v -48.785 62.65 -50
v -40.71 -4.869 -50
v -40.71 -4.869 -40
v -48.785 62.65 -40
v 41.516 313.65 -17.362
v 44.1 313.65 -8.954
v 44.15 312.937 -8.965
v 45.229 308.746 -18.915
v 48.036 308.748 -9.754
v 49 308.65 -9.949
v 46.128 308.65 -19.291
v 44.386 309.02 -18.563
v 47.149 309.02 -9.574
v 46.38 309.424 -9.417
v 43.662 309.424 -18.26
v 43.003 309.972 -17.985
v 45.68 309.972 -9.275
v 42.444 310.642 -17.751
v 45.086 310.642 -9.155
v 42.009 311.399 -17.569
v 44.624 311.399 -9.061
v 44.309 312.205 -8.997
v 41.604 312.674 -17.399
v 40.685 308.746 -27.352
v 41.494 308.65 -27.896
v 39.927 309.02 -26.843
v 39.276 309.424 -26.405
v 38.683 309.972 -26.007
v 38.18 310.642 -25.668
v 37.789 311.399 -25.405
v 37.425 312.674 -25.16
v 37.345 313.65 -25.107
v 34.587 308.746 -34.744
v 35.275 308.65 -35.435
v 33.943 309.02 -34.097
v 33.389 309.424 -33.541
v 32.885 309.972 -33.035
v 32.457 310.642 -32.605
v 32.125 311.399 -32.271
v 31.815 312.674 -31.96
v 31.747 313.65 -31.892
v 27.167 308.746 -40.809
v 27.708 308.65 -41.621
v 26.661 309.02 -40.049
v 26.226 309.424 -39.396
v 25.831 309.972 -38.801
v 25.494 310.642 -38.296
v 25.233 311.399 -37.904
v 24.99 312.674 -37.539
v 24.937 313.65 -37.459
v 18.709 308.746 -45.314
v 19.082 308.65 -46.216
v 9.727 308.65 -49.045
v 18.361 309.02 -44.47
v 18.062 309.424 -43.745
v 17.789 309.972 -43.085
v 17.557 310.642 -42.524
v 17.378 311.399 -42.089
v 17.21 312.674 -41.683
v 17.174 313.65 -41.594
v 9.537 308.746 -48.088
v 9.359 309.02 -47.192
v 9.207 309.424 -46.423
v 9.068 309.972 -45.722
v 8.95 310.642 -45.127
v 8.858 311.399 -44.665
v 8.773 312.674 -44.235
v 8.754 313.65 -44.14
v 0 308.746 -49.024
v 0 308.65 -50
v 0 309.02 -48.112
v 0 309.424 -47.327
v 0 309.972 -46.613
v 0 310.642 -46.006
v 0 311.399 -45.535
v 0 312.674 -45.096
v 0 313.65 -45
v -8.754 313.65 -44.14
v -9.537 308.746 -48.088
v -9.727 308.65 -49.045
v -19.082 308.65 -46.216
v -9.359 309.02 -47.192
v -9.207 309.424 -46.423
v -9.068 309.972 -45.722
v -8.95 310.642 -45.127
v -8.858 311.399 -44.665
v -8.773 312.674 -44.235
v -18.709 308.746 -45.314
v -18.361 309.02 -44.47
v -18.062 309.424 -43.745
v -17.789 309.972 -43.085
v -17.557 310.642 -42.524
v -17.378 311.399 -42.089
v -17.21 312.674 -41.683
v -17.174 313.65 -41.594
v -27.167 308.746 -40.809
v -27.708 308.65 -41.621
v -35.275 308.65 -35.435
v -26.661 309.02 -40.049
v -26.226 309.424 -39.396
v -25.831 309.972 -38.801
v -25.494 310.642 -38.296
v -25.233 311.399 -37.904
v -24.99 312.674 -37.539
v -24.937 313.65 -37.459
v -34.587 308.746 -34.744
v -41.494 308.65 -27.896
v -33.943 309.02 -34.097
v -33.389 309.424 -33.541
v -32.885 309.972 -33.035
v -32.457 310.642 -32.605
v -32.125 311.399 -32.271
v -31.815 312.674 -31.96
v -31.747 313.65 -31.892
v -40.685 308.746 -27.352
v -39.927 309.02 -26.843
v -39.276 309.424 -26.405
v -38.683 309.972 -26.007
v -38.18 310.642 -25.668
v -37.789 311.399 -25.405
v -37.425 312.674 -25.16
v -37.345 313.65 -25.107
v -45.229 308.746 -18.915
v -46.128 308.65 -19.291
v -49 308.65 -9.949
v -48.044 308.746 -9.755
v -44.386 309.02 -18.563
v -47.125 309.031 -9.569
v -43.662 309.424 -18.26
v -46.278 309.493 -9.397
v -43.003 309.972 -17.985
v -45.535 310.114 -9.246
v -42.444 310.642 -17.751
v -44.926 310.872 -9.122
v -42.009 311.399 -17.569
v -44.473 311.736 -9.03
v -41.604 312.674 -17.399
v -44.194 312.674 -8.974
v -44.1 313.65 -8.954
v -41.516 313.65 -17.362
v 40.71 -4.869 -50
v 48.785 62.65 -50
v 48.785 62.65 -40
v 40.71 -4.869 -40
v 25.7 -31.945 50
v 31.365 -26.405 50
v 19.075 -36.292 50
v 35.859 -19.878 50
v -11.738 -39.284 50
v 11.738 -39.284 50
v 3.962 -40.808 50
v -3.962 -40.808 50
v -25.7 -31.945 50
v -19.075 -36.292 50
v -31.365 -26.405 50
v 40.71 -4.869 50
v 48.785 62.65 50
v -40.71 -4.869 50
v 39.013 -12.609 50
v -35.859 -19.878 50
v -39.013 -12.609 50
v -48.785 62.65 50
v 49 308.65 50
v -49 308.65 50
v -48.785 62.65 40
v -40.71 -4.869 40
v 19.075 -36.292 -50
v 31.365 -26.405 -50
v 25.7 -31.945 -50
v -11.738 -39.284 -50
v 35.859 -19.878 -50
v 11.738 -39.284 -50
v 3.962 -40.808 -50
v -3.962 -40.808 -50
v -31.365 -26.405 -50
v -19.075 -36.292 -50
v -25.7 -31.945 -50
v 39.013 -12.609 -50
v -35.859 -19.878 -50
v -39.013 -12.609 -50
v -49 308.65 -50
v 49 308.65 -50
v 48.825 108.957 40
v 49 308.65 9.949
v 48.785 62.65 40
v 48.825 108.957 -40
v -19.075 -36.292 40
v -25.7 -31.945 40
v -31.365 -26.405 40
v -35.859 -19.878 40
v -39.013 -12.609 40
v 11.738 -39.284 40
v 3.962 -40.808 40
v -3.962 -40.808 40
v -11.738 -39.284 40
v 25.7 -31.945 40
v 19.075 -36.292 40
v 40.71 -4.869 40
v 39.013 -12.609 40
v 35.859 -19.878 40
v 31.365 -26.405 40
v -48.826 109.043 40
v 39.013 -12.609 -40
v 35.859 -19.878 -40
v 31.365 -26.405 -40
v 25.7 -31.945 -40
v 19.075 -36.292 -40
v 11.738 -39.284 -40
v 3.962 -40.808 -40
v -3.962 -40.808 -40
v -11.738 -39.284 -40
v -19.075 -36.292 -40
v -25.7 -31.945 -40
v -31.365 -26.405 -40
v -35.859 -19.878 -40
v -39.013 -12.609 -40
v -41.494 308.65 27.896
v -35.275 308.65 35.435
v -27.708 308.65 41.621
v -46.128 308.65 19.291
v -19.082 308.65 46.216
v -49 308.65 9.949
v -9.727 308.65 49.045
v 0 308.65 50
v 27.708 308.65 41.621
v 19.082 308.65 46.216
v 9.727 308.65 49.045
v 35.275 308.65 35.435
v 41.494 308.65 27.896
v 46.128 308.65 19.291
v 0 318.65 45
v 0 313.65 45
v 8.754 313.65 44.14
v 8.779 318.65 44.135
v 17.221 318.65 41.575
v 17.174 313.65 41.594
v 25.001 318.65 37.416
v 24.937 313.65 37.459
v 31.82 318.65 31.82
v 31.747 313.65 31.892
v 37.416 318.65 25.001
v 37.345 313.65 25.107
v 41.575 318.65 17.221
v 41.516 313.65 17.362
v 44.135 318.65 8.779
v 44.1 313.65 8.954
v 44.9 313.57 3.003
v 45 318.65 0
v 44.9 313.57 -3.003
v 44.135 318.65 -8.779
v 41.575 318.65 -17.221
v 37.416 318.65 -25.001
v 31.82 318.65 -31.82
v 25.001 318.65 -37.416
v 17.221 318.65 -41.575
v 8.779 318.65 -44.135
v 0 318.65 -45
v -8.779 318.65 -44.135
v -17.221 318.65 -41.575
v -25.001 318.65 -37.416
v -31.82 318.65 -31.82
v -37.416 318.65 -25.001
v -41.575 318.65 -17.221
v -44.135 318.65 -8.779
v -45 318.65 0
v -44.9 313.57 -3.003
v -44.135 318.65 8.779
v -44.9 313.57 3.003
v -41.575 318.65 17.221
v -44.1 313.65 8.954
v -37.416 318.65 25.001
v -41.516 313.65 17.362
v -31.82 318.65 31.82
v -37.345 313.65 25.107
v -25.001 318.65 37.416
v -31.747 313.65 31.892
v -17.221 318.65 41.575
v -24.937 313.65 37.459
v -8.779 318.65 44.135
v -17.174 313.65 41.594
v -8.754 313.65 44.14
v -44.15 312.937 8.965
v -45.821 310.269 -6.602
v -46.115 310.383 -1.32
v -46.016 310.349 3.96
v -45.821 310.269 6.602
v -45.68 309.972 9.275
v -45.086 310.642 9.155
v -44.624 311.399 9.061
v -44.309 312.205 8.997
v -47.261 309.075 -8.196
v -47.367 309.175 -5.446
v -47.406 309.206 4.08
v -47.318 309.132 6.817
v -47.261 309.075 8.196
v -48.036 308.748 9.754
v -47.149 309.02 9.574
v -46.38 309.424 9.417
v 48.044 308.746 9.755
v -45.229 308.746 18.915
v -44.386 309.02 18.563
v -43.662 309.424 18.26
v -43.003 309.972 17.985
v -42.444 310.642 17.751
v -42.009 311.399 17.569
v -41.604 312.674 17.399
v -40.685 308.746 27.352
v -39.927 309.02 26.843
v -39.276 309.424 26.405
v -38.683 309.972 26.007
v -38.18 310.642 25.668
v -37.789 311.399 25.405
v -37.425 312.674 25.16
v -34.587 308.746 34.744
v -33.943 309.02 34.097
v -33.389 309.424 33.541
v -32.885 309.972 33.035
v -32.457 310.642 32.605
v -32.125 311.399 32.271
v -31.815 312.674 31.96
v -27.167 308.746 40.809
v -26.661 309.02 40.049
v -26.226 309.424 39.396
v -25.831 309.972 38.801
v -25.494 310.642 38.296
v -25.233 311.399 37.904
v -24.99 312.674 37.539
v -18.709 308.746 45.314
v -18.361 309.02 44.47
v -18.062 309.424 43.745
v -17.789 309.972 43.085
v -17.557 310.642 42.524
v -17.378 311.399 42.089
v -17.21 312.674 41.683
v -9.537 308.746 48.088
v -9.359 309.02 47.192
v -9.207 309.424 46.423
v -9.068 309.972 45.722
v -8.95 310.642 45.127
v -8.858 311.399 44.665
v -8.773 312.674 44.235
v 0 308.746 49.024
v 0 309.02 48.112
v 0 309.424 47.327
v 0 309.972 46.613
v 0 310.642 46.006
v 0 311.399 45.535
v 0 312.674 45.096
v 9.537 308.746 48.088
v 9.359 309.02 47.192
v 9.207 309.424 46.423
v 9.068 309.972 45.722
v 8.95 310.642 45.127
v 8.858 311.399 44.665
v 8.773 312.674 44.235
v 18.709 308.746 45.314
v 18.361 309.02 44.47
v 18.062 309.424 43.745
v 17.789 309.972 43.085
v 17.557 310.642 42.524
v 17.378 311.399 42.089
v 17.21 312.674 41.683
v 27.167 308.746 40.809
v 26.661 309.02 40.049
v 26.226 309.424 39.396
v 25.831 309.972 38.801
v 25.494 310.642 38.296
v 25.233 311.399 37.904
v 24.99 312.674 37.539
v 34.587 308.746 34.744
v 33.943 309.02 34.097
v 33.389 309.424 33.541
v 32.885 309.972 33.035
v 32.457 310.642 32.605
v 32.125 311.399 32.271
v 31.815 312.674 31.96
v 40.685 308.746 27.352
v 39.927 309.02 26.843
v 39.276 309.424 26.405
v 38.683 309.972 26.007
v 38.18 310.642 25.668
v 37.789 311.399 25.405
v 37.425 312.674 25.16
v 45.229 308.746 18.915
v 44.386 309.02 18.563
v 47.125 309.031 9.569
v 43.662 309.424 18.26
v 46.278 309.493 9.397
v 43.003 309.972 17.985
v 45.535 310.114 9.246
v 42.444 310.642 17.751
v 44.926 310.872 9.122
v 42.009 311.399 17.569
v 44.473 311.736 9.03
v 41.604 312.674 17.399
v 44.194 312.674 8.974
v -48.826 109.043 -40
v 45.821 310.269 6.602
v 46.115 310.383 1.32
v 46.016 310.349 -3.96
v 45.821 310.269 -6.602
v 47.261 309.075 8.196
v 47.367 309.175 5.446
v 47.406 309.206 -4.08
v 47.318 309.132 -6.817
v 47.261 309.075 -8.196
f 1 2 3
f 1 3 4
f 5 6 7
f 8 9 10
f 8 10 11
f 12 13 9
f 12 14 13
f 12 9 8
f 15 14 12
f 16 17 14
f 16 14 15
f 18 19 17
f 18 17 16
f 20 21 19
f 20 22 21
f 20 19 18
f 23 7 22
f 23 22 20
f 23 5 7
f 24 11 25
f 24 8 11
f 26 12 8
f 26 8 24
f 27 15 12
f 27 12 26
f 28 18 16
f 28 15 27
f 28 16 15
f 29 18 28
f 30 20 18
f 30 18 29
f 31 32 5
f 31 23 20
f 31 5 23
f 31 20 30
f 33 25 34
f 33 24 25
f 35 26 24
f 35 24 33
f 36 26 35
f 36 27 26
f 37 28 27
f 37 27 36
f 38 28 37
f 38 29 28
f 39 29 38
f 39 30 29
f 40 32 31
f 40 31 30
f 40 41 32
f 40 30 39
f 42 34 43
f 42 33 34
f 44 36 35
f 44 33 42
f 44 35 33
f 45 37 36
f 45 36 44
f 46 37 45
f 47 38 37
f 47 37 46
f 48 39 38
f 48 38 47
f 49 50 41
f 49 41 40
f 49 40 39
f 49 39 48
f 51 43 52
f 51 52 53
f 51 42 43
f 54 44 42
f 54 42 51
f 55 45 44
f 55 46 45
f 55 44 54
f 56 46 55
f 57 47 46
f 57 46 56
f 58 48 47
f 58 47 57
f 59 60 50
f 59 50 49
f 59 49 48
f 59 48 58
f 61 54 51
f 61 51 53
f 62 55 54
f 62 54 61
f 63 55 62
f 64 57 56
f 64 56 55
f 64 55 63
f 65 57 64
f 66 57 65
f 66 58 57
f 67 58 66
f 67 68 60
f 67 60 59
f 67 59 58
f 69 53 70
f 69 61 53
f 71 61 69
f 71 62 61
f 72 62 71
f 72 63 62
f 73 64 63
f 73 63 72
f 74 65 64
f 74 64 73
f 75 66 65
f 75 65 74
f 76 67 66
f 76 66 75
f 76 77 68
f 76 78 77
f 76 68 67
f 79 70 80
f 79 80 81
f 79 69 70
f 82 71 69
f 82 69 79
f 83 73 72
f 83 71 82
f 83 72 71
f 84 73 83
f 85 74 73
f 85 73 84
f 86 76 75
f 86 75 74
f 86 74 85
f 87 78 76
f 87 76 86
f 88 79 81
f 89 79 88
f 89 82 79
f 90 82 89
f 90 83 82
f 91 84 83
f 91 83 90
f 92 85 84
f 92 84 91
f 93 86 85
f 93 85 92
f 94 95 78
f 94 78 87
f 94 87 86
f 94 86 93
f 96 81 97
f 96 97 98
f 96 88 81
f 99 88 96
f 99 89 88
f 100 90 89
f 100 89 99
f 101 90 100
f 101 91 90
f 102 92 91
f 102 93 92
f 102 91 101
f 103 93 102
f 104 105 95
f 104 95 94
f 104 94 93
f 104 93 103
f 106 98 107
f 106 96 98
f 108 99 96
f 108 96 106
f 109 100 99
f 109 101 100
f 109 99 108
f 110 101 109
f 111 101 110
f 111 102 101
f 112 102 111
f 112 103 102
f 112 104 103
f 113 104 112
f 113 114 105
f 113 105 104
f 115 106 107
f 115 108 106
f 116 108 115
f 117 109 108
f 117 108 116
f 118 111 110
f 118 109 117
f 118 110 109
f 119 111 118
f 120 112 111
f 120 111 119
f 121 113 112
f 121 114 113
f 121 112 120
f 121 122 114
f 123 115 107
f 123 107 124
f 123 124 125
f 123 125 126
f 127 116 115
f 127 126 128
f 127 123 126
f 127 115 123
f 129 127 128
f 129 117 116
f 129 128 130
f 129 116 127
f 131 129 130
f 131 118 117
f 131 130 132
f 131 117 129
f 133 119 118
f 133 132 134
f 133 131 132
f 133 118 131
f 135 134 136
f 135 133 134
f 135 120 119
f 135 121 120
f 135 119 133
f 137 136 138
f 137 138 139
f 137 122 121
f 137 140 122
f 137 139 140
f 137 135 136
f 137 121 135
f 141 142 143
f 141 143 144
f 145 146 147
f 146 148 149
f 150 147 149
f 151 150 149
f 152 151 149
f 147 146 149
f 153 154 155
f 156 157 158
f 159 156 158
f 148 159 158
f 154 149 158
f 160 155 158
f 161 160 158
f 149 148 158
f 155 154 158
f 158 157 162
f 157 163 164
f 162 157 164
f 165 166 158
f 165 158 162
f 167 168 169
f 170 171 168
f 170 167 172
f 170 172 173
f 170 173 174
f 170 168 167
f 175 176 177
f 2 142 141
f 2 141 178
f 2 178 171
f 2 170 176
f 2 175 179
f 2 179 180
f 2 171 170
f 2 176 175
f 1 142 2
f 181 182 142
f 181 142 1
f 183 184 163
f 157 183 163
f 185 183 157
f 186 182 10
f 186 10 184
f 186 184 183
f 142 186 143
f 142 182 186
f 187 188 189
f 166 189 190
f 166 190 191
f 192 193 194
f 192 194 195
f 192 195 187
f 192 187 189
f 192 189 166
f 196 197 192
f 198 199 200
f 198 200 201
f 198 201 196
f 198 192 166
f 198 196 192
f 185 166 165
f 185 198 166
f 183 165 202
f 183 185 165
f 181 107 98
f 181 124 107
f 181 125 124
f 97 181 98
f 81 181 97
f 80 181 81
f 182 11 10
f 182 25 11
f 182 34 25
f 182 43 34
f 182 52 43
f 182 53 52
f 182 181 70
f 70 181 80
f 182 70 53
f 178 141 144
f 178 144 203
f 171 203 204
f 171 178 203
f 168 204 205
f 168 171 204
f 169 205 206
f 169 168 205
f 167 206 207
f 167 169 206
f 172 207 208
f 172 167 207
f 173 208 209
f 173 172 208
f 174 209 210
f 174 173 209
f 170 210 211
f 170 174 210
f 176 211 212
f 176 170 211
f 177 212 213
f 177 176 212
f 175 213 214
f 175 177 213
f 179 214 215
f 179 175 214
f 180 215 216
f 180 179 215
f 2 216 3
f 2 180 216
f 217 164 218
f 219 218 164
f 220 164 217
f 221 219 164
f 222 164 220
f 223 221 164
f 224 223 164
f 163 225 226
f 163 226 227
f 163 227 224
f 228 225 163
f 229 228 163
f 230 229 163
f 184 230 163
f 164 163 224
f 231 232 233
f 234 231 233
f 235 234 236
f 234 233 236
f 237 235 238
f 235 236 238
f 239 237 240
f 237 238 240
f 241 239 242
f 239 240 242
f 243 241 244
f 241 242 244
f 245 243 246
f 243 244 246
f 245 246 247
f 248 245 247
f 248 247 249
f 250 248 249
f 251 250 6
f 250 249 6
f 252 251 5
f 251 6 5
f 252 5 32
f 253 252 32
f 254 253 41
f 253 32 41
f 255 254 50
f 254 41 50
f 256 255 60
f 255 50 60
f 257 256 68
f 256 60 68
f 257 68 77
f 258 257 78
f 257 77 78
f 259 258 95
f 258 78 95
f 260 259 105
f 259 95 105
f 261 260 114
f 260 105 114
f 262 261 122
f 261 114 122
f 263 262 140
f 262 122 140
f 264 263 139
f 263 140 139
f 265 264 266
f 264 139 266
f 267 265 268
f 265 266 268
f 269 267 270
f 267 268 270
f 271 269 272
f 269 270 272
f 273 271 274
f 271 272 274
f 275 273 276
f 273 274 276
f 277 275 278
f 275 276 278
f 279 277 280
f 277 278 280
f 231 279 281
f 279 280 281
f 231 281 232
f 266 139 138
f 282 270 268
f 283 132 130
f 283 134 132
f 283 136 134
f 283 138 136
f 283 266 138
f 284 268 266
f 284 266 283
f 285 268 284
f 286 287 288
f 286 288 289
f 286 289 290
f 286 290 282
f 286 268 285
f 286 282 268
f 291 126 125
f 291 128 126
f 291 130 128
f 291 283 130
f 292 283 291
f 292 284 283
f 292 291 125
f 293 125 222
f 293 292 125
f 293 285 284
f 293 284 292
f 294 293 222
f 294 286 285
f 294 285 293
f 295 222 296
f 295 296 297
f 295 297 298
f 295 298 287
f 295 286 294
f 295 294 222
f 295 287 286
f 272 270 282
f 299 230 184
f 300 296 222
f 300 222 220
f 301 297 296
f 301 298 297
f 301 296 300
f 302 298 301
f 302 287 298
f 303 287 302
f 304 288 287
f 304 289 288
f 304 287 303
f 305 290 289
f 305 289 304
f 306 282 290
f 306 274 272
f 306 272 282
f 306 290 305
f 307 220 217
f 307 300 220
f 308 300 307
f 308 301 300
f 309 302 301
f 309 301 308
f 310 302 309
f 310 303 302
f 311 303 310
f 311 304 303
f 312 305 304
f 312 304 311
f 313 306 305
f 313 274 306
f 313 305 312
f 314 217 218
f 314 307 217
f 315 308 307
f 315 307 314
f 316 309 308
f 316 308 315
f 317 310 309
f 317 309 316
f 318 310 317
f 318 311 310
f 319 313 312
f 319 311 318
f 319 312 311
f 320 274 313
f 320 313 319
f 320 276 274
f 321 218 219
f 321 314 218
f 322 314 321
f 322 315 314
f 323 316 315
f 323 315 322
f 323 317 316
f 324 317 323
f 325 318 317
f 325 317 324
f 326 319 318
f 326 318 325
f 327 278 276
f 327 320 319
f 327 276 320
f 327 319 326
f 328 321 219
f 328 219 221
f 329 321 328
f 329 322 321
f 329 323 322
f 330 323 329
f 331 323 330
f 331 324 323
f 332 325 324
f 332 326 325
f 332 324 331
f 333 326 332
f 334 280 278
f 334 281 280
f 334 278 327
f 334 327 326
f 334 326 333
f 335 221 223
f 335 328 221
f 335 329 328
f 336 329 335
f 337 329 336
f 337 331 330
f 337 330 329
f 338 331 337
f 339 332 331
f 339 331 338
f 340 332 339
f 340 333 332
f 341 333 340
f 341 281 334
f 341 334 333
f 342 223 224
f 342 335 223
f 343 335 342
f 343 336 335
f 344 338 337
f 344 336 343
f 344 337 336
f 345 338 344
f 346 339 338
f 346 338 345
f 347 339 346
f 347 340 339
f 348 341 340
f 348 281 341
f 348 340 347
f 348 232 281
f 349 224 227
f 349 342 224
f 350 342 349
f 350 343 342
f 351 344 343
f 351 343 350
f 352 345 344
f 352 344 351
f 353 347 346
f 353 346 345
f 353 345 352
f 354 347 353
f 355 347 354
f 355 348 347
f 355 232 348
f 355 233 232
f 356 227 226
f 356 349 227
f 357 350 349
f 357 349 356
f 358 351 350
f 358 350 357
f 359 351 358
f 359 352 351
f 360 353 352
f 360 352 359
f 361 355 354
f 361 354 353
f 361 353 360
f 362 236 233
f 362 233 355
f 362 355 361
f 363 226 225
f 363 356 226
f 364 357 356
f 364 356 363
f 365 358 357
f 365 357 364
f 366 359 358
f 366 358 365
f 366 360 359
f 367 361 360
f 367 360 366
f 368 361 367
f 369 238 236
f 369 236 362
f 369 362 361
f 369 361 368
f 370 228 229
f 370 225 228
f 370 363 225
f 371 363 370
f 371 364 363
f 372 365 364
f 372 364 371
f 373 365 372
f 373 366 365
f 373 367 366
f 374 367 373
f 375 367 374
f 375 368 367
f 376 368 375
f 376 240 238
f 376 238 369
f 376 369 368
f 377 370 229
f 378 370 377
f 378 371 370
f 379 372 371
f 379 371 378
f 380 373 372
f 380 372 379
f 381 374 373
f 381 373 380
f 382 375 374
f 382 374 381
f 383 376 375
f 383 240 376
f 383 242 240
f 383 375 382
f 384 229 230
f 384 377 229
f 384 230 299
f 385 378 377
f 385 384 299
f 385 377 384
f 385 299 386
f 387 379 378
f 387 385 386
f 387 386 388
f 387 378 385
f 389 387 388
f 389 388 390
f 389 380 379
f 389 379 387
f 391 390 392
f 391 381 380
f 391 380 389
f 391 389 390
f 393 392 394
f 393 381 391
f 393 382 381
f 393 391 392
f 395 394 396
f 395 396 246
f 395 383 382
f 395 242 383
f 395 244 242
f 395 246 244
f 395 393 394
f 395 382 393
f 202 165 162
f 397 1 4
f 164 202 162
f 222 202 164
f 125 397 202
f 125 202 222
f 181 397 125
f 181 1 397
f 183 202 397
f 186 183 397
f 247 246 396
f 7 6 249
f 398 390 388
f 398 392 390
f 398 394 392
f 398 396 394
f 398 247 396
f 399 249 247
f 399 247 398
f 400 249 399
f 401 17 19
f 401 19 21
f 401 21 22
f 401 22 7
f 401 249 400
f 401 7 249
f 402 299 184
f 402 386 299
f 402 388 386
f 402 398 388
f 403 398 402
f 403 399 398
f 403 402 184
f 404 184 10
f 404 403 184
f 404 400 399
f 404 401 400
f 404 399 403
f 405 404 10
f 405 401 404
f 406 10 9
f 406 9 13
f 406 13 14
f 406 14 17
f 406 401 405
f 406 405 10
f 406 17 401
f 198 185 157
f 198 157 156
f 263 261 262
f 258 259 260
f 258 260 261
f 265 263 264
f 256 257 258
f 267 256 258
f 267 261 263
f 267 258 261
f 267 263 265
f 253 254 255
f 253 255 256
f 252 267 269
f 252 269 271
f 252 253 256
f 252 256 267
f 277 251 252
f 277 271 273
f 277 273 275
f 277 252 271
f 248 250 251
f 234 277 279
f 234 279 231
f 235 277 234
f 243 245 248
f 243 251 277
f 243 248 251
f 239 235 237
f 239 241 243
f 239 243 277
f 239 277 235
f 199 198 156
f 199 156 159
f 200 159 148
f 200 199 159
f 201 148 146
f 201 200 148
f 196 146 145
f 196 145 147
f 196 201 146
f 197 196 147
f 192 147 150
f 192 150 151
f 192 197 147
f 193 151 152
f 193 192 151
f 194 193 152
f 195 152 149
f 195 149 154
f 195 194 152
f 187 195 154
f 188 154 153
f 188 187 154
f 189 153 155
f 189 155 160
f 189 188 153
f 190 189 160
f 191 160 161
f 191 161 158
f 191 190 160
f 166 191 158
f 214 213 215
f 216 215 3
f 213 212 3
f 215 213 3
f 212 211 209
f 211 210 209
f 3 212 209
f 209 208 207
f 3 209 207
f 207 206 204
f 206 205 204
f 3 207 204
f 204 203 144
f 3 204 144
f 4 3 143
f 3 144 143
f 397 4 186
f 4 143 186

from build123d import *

# Parameters (mm, degrees)
BOSS_EXTRUDE1_DEPTH      = 50
BOSS_EXTRUDE1_DEPTH_BACK = 50
SKETCH2_W                = 80
SKETCH2_H                = 150
CUT_EXTRUDE1_DEPTH       = 367.509355196
SKETCH3_R                = 45
BOSS_EXTRUDE2_DEPTH      = 10
FILLET1_R                = 5


with BuildPart() as part:
    # Sketch1 → Boss-Extrude1 (new, two sides: drawn at the far end of the back side and taken through both)
    with BuildSketch(Plane.XY.offset(-BOSS_EXTRUDE1_DEPTH_BACK)):
        with BuildLine():
            Line((-49, 0), (49, 0))
            Line((49, 0), (48.785008207, -245.999906054))
            Line((48.785008207, -245.999906054), (40.709882529, -313.518735615))
            ThreePointArc((40.709882529, -313.518735615), (0, -349.649909839), (-40.709882529, -313.518735615))
            Line((-40.709882529, -313.518735615), (-48.785008207, -245.999906054))
            Line((-48.785008207, -245.999906054), (-49, 0))
        make_face()
    extrude(amount=BOSS_EXTRUDE1_DEPTH + BOSS_EXTRUDE1_DEPTH_BACK)

    # Sketch2 → Cut-Extrude1 (cut, through all)
    with BuildSketch(Plane(origin=(48.999962574, -0.042823552, 0), x_dir=(0, 0, -1), z_dir=(0.9999996181052956, -0.0008739503779168433, 0))):
        with Locations((0, -274.649791967)):
            Rectangle(SKETCH2_W, SKETCH2_H)
    extrude(amount=-CUT_EXTRUDE1_DEPTH, mode=Mode.SUBTRACT)

    # Sketch3 → Boss-Extrude2 (add)
    with BuildSketch(Plane(origin=(0, 0, 0), x_dir=(1, 0, 0), z_dir=(0, 1, 0))):
        with Locations(Location((0, 0, 0), (0, 0, 270))):
            Circle(SKETCH3_R)
    extrude(amount=BOSS_EXTRUDE2_DEPTH)

    # Fillet1
    fillet1_edges = [part.edges().sort_by_distance(p)[0] for p in [
        (0, 0, -45),
    ]]
    fillet(fillet1_edges, radius=FILLET1_R - 0.0001)  # a hair under: the kernel refuses the full size


with BuildPart() as part_1:
    # Body-Move/Copy1: moved
    add(part.part.moved(Location((0, 308.649909839, 0))))


solid = part_1.part
